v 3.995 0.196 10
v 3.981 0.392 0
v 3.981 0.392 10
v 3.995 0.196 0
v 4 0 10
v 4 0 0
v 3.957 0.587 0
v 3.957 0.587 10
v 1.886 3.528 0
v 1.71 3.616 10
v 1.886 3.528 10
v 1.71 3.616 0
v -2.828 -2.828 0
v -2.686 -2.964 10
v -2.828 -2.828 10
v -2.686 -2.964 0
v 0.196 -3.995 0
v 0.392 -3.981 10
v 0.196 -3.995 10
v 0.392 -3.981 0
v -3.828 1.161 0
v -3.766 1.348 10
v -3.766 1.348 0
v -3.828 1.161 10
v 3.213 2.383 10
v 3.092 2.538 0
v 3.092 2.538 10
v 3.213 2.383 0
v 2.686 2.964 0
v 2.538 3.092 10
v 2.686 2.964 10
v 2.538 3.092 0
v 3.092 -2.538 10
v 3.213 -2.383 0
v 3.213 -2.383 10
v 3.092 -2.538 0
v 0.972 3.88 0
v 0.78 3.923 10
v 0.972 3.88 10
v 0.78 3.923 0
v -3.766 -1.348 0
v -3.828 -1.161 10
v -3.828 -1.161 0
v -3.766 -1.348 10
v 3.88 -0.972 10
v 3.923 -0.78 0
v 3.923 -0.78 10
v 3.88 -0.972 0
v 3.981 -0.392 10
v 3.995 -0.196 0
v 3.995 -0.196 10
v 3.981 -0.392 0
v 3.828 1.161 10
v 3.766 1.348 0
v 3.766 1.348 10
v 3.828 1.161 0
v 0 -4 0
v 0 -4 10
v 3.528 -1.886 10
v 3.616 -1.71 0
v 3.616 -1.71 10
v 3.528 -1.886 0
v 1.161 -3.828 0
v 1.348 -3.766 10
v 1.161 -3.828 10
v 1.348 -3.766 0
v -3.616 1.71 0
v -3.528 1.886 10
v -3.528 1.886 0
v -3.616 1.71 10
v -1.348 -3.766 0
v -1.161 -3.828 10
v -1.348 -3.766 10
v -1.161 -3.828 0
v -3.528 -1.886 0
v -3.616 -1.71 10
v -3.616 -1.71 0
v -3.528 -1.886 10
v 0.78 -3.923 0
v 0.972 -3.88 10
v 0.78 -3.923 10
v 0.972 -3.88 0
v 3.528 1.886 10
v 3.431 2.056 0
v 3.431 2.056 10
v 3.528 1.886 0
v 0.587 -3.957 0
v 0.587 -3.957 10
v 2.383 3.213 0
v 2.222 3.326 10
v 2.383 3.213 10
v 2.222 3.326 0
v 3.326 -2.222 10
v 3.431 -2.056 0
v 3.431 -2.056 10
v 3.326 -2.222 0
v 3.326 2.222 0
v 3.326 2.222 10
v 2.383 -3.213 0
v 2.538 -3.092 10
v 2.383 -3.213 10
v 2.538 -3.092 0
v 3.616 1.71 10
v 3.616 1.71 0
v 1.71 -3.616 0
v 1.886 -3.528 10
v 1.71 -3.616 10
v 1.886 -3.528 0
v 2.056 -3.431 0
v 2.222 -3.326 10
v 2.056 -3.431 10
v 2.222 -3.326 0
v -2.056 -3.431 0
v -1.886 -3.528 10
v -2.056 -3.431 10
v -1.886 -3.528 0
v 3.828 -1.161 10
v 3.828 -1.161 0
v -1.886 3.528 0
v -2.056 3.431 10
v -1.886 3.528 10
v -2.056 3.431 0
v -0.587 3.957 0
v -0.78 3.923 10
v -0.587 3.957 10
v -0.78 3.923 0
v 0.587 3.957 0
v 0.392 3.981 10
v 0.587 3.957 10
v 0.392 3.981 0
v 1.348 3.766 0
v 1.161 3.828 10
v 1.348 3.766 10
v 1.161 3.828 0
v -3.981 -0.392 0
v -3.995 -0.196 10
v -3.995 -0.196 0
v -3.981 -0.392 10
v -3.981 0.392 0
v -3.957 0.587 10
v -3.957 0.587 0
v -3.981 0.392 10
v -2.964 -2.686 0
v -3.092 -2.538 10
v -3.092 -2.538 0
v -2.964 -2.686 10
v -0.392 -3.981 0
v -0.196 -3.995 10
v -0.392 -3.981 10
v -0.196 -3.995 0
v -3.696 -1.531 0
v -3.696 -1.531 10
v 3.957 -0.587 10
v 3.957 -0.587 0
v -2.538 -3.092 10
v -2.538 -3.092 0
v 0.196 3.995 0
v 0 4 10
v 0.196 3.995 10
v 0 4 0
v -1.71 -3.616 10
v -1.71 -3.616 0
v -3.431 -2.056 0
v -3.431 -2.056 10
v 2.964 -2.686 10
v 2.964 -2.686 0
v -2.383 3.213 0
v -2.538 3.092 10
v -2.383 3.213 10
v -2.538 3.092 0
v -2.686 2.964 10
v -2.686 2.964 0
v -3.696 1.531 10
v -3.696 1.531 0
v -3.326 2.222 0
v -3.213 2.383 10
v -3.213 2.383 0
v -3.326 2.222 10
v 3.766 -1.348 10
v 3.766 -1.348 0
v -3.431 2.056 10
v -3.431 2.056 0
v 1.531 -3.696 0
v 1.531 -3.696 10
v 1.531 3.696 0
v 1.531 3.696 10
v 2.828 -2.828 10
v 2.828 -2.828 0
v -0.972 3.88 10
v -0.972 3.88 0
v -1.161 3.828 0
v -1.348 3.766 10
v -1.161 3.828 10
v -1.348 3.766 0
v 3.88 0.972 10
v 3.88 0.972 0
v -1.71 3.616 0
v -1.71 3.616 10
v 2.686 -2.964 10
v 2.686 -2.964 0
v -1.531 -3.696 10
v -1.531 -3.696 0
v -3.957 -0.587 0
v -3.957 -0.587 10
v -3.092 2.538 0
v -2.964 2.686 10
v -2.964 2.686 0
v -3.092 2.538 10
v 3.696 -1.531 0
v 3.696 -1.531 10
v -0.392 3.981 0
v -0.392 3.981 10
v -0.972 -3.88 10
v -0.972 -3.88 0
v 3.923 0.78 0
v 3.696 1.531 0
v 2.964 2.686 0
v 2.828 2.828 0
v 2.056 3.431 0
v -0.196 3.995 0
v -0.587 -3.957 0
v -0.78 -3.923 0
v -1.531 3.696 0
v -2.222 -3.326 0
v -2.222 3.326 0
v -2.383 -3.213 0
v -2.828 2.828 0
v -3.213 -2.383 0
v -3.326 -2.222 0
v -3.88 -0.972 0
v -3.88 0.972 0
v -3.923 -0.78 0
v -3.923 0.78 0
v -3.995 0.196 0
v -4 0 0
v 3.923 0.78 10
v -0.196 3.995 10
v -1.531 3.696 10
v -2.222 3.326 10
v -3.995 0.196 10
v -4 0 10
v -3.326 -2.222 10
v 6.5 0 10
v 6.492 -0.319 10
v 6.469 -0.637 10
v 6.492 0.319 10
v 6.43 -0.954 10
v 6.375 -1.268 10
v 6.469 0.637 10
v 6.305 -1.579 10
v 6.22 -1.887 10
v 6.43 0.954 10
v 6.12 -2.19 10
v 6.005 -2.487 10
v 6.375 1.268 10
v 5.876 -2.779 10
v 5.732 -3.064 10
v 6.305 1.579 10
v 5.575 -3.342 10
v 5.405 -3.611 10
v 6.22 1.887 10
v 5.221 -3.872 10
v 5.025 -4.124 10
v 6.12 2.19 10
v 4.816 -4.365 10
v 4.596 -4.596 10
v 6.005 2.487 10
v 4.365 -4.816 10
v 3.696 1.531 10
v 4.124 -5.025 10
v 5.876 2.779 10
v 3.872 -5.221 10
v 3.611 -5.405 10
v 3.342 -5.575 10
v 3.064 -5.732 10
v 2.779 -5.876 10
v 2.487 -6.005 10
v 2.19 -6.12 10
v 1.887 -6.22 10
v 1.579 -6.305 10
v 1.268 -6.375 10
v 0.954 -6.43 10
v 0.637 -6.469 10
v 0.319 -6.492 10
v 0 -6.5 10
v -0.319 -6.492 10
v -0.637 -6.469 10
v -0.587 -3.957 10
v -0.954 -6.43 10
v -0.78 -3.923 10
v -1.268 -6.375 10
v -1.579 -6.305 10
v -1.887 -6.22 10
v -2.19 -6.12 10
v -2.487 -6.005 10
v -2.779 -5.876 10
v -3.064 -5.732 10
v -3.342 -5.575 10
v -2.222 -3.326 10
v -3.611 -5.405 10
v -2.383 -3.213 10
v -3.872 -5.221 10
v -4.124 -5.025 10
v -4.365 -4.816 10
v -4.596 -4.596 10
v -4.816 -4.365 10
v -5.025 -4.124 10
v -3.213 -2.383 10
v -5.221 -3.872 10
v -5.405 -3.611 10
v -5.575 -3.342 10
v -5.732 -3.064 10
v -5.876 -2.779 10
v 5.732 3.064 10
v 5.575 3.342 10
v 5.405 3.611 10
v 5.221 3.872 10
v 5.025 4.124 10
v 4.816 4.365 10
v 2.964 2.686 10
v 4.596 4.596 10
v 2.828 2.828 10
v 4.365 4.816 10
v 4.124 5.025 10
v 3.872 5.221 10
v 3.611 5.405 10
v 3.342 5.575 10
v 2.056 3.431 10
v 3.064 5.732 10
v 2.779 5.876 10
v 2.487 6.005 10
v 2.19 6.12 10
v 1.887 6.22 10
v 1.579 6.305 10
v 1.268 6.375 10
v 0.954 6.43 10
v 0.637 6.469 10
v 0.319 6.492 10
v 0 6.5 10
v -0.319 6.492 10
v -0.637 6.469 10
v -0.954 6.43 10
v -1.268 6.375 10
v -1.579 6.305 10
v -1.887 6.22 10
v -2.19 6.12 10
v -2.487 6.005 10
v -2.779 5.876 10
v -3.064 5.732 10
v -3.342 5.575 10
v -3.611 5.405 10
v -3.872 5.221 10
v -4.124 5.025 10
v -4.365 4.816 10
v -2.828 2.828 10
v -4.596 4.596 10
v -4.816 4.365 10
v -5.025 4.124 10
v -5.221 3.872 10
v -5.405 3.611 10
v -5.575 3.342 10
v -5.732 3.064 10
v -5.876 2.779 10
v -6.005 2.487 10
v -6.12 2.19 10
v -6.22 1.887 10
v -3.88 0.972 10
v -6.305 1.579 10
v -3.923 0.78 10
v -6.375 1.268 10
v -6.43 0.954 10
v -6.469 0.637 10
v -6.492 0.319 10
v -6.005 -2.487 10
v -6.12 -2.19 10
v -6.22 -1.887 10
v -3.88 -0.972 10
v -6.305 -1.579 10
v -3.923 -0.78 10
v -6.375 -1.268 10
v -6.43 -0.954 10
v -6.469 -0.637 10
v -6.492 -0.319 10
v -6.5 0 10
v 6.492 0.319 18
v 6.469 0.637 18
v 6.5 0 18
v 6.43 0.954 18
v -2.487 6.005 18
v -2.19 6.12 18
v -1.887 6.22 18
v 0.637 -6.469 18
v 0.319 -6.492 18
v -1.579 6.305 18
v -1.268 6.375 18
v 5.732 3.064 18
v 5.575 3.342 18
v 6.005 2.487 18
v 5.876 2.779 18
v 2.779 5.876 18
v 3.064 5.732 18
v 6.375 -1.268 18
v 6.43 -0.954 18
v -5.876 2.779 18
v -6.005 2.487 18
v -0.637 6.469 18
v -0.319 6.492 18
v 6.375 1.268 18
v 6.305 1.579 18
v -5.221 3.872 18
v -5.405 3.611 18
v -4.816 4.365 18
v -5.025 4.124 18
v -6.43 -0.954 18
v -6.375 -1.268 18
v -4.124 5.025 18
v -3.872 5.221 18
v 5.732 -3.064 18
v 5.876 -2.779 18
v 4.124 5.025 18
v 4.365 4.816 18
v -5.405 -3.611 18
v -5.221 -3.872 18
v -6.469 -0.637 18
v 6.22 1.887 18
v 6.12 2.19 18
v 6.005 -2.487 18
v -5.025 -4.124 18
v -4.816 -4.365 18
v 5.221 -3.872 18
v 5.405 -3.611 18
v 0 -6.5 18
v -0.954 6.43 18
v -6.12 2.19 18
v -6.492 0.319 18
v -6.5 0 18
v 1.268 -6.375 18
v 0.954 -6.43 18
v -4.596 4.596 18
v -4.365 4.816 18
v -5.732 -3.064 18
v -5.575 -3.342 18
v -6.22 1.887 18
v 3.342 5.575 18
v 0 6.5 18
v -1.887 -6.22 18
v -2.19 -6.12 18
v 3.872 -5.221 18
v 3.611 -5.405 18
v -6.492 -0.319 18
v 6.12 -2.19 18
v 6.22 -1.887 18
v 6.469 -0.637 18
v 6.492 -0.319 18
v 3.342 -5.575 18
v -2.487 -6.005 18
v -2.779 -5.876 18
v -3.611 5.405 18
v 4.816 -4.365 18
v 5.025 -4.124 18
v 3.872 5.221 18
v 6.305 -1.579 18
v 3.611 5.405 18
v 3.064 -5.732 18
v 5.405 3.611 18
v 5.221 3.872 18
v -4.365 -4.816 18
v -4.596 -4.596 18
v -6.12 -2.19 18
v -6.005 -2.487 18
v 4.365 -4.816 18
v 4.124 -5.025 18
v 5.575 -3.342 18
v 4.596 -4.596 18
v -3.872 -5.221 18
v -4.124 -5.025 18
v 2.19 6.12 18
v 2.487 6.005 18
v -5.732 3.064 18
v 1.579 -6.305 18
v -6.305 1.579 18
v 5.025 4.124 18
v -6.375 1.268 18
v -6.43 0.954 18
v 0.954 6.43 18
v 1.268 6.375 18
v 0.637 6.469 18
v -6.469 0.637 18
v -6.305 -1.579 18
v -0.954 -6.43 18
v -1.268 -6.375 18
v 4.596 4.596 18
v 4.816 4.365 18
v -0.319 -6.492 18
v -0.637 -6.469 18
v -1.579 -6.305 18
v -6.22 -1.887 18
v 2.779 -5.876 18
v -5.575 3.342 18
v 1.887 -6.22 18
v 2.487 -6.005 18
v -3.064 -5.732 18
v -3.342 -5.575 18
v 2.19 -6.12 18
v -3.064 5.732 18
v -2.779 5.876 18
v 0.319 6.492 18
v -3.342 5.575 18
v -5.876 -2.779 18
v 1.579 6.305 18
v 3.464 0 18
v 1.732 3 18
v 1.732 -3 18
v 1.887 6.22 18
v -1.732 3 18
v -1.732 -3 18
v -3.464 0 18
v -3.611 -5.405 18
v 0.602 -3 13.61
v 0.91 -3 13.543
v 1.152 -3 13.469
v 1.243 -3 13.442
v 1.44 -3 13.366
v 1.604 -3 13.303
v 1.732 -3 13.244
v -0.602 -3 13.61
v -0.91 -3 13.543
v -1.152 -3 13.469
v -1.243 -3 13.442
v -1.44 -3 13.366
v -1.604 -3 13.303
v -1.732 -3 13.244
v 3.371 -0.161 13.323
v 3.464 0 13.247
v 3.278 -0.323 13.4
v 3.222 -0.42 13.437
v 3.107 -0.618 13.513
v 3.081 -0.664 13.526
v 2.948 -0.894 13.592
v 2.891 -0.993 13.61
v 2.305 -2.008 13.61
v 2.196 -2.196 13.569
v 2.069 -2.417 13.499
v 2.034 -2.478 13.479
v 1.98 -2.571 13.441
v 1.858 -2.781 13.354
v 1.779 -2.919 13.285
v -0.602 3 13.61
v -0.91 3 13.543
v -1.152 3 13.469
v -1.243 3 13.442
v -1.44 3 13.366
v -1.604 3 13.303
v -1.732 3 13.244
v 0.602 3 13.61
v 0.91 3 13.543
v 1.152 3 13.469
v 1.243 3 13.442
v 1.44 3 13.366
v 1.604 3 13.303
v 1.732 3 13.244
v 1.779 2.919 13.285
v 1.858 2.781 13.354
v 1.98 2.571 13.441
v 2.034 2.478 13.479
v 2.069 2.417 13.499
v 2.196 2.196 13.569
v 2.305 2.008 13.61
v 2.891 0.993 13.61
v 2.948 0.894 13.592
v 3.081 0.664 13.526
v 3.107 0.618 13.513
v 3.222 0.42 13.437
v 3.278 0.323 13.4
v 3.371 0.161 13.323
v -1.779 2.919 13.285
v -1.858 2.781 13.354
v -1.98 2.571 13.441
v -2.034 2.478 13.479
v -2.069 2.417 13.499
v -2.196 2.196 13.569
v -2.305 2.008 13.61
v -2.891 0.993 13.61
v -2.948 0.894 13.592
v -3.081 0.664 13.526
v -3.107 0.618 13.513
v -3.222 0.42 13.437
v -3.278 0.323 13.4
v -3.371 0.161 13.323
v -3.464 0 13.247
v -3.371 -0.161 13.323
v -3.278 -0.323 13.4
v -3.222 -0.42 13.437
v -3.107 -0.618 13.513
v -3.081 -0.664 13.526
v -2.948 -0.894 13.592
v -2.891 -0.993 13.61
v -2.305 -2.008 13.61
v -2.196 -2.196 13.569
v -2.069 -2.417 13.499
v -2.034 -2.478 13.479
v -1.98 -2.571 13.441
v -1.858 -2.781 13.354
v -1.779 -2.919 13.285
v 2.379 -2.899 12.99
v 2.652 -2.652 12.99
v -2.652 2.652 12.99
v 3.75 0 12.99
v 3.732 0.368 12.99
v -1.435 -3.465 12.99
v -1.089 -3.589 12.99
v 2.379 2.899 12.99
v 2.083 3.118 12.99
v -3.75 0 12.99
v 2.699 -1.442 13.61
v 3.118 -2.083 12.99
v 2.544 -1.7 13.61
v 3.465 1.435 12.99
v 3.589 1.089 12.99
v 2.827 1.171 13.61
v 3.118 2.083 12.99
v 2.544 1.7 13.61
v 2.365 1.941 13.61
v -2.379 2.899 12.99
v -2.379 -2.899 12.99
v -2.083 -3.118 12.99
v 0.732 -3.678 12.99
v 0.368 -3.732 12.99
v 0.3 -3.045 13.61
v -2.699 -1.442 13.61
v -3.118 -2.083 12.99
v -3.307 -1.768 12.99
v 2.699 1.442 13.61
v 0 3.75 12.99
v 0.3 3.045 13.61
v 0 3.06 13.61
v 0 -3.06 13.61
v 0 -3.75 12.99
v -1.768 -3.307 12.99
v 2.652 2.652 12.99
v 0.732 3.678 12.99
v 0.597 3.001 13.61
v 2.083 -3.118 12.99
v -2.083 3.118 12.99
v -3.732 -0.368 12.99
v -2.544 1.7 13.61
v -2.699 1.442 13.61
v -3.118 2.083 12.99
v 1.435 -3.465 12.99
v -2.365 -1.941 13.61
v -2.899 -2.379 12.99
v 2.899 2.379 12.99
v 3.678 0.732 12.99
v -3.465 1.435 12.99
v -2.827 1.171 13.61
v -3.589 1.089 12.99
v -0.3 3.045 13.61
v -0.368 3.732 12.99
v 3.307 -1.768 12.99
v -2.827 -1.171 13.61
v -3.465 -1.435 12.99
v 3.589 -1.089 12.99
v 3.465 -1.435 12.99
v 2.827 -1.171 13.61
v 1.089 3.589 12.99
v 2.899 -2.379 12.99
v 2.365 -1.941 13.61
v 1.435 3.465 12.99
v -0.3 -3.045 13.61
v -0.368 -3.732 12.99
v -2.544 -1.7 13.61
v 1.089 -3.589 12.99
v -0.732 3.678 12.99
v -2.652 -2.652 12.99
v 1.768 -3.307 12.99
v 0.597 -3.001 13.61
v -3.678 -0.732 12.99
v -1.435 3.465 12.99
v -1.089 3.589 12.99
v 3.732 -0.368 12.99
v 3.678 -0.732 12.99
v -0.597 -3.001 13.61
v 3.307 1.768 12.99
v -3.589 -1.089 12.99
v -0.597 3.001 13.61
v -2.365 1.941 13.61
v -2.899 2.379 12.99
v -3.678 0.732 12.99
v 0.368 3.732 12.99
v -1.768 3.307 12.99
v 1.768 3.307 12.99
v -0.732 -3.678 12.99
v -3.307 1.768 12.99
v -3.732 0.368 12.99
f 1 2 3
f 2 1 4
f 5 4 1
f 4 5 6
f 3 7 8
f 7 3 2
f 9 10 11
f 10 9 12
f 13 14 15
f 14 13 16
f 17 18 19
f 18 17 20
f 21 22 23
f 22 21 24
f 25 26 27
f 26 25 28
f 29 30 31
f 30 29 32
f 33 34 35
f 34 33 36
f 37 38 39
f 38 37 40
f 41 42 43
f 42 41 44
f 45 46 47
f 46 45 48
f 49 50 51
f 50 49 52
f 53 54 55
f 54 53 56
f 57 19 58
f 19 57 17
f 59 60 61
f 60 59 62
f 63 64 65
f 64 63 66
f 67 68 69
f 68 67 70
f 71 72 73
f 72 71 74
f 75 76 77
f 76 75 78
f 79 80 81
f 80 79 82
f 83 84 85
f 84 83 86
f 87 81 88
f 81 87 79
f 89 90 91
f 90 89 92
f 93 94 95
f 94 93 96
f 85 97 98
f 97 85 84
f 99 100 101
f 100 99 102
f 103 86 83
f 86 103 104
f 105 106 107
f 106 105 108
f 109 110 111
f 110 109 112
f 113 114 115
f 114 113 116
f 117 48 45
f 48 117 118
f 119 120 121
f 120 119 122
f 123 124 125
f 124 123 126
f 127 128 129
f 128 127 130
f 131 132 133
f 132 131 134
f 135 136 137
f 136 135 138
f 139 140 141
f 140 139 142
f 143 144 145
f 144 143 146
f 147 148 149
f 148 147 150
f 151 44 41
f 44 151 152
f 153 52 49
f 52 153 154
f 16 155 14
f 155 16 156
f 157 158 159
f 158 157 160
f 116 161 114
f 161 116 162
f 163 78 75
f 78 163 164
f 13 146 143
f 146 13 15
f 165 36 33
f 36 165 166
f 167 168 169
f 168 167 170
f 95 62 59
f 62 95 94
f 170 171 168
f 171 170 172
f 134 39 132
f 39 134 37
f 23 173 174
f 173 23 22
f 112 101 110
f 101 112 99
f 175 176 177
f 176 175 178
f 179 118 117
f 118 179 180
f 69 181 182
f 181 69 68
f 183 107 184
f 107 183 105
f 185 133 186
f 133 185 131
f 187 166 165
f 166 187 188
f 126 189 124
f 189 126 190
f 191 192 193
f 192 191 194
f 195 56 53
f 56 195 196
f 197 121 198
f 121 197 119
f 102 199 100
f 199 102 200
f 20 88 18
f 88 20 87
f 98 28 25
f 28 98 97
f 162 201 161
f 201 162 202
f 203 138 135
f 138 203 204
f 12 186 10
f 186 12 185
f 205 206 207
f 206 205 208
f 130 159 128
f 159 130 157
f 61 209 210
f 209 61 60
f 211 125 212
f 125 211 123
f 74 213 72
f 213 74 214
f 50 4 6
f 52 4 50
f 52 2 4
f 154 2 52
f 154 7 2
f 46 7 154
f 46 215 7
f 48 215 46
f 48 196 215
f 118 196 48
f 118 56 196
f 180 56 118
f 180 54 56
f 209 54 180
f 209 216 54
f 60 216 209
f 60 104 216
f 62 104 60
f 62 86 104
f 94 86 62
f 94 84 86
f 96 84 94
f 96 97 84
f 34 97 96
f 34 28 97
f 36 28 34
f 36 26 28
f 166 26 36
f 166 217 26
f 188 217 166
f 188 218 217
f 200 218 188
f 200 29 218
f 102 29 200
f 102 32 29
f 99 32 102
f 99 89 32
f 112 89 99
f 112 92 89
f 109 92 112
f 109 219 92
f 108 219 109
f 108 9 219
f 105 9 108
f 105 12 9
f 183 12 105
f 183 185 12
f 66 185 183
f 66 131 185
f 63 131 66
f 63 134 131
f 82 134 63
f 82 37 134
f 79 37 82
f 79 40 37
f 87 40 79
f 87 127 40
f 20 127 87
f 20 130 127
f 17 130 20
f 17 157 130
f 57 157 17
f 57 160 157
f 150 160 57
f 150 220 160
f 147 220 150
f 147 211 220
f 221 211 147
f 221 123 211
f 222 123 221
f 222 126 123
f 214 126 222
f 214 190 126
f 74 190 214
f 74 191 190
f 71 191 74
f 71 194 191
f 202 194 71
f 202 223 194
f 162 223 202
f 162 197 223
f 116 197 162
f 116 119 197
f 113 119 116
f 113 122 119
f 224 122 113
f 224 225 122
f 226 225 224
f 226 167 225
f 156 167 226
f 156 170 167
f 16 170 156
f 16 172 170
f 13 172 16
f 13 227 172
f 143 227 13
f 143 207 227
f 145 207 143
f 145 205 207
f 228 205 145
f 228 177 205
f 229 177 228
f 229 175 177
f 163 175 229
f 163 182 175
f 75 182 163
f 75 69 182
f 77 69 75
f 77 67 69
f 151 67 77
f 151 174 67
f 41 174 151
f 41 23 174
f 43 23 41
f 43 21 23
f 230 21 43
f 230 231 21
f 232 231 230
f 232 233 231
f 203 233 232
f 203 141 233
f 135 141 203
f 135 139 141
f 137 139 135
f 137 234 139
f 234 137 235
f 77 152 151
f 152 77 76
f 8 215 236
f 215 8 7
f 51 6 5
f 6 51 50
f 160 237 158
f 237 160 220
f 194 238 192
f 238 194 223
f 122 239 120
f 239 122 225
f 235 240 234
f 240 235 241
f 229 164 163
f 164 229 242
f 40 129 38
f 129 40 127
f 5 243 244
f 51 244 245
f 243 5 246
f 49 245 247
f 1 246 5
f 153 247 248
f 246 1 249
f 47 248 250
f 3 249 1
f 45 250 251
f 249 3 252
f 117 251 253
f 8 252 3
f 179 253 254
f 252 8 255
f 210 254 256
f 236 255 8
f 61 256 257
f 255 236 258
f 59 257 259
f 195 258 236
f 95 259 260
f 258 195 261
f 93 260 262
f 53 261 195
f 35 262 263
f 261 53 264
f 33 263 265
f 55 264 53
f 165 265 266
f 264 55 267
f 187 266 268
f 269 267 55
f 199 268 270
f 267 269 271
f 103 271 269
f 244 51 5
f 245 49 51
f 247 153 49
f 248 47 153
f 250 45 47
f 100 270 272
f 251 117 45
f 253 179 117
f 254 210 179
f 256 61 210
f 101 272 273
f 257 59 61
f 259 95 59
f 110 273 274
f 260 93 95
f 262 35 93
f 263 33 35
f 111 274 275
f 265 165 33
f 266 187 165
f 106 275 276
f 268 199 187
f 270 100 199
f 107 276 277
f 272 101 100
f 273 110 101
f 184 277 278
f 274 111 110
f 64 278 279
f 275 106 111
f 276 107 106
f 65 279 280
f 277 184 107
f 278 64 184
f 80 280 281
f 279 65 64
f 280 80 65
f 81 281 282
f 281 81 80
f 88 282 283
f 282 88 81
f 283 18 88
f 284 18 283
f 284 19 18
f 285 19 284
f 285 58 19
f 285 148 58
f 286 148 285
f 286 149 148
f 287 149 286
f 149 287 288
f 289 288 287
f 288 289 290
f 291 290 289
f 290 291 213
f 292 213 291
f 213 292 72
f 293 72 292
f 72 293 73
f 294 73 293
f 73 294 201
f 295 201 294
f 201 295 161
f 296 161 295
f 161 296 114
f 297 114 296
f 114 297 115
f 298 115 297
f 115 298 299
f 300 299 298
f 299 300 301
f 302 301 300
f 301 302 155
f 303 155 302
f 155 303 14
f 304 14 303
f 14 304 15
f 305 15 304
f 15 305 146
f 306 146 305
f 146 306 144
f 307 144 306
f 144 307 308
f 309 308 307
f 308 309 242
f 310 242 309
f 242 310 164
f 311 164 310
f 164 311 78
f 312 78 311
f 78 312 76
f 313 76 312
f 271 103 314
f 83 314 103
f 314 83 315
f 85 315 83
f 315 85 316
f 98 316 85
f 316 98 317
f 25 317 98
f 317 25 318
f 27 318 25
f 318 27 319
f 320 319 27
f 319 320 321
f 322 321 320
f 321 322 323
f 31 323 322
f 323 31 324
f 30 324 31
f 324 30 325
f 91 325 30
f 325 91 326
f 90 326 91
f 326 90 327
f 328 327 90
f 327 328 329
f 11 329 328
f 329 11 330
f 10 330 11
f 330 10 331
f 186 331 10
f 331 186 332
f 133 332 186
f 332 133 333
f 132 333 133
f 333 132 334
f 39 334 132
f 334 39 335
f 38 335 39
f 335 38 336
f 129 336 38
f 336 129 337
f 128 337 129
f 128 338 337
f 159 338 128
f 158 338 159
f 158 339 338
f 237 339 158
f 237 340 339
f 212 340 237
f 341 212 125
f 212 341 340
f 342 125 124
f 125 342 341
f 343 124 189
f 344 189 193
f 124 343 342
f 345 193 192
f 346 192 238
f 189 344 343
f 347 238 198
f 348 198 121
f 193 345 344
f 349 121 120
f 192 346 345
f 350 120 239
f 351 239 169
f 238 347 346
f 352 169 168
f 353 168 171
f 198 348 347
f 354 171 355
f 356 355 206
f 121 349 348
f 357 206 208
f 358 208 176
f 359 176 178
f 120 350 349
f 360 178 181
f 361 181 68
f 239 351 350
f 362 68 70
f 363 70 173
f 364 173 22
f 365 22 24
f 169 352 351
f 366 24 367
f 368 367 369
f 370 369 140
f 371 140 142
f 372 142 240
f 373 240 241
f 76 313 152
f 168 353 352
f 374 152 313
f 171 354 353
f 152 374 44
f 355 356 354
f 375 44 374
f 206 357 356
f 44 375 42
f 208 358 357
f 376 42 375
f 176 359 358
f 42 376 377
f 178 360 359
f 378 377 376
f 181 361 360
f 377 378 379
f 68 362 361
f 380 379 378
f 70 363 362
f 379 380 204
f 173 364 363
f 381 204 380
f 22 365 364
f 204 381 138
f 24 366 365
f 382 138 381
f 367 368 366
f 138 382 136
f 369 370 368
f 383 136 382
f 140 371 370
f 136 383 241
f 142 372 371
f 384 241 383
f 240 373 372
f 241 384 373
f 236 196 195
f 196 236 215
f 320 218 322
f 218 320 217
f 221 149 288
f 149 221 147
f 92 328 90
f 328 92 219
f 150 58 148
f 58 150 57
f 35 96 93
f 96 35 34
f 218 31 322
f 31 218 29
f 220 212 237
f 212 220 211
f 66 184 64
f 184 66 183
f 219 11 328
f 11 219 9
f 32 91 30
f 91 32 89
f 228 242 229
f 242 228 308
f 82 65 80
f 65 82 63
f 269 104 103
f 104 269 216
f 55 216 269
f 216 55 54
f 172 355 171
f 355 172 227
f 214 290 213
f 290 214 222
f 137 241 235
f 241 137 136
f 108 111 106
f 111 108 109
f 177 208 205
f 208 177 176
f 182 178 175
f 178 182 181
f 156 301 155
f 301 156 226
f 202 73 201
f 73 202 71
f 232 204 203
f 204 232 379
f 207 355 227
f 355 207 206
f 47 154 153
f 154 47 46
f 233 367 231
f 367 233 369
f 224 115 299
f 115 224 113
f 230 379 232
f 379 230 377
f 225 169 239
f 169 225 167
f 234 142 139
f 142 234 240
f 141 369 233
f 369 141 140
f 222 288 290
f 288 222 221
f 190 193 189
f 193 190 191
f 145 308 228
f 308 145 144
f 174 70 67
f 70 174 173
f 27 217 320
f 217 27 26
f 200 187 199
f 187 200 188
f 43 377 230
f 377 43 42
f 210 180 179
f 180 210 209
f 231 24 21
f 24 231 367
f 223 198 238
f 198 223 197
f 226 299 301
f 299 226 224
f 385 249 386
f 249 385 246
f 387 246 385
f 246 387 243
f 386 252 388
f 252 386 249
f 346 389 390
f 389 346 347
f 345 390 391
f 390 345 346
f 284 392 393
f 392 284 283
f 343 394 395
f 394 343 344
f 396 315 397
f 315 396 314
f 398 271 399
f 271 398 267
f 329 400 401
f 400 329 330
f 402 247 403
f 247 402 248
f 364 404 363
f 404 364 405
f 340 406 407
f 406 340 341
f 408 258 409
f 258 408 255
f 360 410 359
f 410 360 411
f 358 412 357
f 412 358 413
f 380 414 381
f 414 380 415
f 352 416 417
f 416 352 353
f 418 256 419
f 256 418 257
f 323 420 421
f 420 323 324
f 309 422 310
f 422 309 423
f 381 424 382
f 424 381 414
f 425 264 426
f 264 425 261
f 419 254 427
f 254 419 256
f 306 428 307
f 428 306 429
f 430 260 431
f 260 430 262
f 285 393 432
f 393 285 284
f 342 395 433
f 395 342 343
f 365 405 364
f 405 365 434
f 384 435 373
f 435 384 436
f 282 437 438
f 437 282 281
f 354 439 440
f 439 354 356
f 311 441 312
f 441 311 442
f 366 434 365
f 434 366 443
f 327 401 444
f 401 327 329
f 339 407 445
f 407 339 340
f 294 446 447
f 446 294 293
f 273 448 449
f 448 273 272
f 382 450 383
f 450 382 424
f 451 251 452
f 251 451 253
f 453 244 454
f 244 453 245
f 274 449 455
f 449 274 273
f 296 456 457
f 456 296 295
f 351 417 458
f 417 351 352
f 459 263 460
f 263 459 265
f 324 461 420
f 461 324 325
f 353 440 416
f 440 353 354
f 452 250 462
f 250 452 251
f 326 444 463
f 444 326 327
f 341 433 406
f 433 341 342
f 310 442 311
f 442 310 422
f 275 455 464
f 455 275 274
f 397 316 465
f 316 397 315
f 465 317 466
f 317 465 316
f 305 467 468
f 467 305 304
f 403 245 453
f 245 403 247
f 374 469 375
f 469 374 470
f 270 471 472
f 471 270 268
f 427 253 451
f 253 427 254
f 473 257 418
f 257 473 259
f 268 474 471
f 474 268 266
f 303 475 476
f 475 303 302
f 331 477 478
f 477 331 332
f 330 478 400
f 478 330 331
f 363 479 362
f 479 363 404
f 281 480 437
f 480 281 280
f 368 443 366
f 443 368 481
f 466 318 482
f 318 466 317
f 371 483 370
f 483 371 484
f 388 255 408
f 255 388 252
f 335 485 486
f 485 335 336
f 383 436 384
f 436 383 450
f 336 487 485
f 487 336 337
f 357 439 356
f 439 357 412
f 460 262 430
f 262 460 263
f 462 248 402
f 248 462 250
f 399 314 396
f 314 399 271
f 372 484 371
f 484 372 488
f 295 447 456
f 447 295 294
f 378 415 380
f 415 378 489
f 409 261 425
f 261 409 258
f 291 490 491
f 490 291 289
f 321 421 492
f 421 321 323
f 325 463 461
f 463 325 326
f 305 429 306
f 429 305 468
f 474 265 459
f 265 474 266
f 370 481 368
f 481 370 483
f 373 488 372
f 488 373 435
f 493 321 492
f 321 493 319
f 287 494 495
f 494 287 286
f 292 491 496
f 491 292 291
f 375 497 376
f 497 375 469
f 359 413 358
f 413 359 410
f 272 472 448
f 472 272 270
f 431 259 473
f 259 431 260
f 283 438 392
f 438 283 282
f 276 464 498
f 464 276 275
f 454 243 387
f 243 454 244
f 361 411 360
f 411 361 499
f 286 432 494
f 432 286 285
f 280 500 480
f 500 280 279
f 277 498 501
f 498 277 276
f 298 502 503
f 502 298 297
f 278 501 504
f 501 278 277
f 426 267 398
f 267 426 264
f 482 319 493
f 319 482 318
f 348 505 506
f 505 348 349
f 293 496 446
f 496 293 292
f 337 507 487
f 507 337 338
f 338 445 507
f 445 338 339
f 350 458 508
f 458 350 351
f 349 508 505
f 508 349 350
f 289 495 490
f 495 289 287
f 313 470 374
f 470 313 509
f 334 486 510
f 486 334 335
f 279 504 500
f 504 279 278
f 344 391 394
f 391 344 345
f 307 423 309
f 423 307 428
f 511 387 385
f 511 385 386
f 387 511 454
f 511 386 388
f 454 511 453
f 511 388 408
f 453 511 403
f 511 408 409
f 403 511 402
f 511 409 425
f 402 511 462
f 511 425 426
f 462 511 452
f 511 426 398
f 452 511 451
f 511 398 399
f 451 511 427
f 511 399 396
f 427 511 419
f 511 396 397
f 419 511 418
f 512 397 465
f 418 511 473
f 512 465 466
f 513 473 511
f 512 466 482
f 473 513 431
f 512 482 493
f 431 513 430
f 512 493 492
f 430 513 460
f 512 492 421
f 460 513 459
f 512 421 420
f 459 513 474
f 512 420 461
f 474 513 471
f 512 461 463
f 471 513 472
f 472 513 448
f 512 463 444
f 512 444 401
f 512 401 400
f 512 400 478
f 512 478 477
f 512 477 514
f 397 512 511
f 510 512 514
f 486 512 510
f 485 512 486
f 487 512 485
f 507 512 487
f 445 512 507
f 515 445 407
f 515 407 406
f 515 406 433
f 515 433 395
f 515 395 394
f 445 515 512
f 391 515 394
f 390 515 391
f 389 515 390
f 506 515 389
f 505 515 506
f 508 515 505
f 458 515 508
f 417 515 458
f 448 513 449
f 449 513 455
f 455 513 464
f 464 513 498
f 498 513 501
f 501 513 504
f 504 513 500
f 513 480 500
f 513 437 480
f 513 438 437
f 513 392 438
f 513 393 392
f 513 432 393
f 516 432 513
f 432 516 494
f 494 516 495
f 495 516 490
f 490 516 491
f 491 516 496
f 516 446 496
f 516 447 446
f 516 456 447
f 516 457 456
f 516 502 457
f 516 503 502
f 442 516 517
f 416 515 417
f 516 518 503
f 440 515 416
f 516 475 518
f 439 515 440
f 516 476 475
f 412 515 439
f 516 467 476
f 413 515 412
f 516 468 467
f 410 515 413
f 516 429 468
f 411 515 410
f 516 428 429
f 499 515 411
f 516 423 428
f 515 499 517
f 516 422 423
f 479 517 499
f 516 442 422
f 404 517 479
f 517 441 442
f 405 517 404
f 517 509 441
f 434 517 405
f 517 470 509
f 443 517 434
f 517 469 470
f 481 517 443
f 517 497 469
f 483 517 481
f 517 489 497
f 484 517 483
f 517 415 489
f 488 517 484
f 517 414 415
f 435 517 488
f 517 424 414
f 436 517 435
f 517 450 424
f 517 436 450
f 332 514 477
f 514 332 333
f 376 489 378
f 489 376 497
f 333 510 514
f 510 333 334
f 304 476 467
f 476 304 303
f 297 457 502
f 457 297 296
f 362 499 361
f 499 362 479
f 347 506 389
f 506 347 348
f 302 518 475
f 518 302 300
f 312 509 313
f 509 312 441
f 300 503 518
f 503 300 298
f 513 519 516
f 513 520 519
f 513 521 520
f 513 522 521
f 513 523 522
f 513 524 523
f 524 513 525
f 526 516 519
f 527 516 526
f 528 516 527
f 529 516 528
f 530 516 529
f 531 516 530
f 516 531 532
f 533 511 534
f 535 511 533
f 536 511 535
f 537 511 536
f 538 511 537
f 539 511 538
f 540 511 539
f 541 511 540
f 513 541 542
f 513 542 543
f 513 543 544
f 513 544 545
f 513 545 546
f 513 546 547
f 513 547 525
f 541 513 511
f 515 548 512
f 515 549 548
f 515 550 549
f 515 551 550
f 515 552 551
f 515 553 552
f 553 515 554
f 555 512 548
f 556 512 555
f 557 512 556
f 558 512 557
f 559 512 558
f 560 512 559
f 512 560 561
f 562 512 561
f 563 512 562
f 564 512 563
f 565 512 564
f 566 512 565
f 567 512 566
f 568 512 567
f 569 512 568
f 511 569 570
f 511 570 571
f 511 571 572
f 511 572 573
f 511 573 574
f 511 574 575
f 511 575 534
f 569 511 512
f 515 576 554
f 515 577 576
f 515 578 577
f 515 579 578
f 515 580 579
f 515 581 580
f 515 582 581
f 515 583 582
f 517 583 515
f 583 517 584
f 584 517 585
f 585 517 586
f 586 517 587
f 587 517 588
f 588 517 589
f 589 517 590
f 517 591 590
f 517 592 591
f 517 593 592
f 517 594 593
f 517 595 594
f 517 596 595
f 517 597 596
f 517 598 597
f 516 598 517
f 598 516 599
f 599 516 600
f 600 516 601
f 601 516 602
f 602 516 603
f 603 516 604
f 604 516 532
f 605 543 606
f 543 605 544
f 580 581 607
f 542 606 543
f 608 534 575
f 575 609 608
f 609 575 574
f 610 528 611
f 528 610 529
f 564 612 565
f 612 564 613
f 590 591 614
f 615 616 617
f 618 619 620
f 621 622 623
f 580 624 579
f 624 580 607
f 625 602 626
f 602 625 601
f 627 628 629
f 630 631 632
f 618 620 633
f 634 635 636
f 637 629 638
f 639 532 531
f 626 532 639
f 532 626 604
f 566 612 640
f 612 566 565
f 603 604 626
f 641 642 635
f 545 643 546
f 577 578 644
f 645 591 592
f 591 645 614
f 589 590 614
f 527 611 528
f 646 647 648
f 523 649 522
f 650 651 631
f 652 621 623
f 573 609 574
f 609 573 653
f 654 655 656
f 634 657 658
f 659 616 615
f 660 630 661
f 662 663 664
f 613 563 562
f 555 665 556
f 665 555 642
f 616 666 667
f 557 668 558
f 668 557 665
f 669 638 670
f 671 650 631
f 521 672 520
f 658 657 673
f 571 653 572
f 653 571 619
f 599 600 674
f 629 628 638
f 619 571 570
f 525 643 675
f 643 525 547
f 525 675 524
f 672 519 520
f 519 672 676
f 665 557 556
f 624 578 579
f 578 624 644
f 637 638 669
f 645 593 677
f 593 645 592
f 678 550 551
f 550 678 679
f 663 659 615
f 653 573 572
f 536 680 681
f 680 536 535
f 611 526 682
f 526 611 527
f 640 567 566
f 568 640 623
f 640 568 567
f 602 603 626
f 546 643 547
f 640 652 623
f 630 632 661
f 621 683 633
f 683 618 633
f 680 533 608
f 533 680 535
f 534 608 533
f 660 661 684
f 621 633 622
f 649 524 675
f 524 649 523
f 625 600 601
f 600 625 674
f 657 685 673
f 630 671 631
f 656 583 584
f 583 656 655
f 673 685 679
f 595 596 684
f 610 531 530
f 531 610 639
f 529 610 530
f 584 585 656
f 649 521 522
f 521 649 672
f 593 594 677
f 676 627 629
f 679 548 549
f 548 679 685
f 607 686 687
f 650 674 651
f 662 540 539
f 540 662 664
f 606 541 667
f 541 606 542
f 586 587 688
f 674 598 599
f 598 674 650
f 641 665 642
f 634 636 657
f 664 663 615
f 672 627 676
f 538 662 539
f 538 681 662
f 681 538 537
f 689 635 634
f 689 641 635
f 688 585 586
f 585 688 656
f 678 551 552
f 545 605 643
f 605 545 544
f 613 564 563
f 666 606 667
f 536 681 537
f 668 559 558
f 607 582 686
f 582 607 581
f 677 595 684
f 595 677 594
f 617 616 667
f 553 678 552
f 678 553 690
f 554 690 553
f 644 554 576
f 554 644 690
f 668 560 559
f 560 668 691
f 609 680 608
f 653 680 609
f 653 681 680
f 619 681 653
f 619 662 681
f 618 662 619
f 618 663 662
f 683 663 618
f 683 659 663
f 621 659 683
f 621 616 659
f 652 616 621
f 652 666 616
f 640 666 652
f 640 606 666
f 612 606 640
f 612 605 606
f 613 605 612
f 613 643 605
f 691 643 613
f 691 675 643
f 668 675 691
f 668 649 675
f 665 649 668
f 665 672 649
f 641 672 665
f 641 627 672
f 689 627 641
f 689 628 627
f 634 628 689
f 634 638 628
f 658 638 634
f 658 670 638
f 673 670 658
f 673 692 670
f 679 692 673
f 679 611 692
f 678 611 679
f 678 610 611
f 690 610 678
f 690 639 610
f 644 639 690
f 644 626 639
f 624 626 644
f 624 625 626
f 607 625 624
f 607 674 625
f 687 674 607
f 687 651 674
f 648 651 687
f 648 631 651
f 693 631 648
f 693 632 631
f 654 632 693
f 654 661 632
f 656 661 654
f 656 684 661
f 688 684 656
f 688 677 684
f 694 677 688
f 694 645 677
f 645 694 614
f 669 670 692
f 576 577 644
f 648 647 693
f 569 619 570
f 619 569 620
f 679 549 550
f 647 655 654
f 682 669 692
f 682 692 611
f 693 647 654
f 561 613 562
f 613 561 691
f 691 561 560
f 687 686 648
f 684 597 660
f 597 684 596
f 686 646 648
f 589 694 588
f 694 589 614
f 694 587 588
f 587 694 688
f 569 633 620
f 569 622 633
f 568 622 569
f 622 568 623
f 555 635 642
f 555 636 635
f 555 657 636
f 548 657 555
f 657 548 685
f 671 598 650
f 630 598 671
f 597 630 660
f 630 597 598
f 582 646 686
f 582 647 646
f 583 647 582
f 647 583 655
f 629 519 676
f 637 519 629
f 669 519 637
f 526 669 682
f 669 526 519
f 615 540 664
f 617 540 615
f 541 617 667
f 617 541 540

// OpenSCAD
$fn = 128;

d_shaft = 8.0;
L = 10.0;

d_head = 13.0;
h_head = 8.0;

// Approximate hex socket dimensions for an M8 socket head cap screw
socket_af = 6.0;          // across flats
socket_depth = 5.0;       // depth of hex recess
socket_chamfer = 0.6;     // small entry chamfer

module hex_prism(af, h) {
    // Regular hex with across-flats = af
    r = af / sqrt(3); // circumradius
    cylinder(h=h, r=r, $fn=6);
}

module socket_head_cap_screw() {
    difference() {
        union() {
            // Shaft
            cylinder(h=L, d=d_shaft);

            // Head
            translate([0,0,L])
                cylinder(h=h_head, d=d_head);
        }

        // Hex socket recess
        translate([0,0,L + h_head - socket_depth])
            hex_prism(socket_af, socket_depth + 0.02);

        // Entry chamfer (simple conical lead-in)
        translate([0,0,L + h_head - socket_depth - 0.01])
            cylinder(h=socket_chamfer + 0.02, d1=socket_af*1.25, d2=socket_af*1.02, $fn=64);
    }
}

socket_head_cap_screw();
